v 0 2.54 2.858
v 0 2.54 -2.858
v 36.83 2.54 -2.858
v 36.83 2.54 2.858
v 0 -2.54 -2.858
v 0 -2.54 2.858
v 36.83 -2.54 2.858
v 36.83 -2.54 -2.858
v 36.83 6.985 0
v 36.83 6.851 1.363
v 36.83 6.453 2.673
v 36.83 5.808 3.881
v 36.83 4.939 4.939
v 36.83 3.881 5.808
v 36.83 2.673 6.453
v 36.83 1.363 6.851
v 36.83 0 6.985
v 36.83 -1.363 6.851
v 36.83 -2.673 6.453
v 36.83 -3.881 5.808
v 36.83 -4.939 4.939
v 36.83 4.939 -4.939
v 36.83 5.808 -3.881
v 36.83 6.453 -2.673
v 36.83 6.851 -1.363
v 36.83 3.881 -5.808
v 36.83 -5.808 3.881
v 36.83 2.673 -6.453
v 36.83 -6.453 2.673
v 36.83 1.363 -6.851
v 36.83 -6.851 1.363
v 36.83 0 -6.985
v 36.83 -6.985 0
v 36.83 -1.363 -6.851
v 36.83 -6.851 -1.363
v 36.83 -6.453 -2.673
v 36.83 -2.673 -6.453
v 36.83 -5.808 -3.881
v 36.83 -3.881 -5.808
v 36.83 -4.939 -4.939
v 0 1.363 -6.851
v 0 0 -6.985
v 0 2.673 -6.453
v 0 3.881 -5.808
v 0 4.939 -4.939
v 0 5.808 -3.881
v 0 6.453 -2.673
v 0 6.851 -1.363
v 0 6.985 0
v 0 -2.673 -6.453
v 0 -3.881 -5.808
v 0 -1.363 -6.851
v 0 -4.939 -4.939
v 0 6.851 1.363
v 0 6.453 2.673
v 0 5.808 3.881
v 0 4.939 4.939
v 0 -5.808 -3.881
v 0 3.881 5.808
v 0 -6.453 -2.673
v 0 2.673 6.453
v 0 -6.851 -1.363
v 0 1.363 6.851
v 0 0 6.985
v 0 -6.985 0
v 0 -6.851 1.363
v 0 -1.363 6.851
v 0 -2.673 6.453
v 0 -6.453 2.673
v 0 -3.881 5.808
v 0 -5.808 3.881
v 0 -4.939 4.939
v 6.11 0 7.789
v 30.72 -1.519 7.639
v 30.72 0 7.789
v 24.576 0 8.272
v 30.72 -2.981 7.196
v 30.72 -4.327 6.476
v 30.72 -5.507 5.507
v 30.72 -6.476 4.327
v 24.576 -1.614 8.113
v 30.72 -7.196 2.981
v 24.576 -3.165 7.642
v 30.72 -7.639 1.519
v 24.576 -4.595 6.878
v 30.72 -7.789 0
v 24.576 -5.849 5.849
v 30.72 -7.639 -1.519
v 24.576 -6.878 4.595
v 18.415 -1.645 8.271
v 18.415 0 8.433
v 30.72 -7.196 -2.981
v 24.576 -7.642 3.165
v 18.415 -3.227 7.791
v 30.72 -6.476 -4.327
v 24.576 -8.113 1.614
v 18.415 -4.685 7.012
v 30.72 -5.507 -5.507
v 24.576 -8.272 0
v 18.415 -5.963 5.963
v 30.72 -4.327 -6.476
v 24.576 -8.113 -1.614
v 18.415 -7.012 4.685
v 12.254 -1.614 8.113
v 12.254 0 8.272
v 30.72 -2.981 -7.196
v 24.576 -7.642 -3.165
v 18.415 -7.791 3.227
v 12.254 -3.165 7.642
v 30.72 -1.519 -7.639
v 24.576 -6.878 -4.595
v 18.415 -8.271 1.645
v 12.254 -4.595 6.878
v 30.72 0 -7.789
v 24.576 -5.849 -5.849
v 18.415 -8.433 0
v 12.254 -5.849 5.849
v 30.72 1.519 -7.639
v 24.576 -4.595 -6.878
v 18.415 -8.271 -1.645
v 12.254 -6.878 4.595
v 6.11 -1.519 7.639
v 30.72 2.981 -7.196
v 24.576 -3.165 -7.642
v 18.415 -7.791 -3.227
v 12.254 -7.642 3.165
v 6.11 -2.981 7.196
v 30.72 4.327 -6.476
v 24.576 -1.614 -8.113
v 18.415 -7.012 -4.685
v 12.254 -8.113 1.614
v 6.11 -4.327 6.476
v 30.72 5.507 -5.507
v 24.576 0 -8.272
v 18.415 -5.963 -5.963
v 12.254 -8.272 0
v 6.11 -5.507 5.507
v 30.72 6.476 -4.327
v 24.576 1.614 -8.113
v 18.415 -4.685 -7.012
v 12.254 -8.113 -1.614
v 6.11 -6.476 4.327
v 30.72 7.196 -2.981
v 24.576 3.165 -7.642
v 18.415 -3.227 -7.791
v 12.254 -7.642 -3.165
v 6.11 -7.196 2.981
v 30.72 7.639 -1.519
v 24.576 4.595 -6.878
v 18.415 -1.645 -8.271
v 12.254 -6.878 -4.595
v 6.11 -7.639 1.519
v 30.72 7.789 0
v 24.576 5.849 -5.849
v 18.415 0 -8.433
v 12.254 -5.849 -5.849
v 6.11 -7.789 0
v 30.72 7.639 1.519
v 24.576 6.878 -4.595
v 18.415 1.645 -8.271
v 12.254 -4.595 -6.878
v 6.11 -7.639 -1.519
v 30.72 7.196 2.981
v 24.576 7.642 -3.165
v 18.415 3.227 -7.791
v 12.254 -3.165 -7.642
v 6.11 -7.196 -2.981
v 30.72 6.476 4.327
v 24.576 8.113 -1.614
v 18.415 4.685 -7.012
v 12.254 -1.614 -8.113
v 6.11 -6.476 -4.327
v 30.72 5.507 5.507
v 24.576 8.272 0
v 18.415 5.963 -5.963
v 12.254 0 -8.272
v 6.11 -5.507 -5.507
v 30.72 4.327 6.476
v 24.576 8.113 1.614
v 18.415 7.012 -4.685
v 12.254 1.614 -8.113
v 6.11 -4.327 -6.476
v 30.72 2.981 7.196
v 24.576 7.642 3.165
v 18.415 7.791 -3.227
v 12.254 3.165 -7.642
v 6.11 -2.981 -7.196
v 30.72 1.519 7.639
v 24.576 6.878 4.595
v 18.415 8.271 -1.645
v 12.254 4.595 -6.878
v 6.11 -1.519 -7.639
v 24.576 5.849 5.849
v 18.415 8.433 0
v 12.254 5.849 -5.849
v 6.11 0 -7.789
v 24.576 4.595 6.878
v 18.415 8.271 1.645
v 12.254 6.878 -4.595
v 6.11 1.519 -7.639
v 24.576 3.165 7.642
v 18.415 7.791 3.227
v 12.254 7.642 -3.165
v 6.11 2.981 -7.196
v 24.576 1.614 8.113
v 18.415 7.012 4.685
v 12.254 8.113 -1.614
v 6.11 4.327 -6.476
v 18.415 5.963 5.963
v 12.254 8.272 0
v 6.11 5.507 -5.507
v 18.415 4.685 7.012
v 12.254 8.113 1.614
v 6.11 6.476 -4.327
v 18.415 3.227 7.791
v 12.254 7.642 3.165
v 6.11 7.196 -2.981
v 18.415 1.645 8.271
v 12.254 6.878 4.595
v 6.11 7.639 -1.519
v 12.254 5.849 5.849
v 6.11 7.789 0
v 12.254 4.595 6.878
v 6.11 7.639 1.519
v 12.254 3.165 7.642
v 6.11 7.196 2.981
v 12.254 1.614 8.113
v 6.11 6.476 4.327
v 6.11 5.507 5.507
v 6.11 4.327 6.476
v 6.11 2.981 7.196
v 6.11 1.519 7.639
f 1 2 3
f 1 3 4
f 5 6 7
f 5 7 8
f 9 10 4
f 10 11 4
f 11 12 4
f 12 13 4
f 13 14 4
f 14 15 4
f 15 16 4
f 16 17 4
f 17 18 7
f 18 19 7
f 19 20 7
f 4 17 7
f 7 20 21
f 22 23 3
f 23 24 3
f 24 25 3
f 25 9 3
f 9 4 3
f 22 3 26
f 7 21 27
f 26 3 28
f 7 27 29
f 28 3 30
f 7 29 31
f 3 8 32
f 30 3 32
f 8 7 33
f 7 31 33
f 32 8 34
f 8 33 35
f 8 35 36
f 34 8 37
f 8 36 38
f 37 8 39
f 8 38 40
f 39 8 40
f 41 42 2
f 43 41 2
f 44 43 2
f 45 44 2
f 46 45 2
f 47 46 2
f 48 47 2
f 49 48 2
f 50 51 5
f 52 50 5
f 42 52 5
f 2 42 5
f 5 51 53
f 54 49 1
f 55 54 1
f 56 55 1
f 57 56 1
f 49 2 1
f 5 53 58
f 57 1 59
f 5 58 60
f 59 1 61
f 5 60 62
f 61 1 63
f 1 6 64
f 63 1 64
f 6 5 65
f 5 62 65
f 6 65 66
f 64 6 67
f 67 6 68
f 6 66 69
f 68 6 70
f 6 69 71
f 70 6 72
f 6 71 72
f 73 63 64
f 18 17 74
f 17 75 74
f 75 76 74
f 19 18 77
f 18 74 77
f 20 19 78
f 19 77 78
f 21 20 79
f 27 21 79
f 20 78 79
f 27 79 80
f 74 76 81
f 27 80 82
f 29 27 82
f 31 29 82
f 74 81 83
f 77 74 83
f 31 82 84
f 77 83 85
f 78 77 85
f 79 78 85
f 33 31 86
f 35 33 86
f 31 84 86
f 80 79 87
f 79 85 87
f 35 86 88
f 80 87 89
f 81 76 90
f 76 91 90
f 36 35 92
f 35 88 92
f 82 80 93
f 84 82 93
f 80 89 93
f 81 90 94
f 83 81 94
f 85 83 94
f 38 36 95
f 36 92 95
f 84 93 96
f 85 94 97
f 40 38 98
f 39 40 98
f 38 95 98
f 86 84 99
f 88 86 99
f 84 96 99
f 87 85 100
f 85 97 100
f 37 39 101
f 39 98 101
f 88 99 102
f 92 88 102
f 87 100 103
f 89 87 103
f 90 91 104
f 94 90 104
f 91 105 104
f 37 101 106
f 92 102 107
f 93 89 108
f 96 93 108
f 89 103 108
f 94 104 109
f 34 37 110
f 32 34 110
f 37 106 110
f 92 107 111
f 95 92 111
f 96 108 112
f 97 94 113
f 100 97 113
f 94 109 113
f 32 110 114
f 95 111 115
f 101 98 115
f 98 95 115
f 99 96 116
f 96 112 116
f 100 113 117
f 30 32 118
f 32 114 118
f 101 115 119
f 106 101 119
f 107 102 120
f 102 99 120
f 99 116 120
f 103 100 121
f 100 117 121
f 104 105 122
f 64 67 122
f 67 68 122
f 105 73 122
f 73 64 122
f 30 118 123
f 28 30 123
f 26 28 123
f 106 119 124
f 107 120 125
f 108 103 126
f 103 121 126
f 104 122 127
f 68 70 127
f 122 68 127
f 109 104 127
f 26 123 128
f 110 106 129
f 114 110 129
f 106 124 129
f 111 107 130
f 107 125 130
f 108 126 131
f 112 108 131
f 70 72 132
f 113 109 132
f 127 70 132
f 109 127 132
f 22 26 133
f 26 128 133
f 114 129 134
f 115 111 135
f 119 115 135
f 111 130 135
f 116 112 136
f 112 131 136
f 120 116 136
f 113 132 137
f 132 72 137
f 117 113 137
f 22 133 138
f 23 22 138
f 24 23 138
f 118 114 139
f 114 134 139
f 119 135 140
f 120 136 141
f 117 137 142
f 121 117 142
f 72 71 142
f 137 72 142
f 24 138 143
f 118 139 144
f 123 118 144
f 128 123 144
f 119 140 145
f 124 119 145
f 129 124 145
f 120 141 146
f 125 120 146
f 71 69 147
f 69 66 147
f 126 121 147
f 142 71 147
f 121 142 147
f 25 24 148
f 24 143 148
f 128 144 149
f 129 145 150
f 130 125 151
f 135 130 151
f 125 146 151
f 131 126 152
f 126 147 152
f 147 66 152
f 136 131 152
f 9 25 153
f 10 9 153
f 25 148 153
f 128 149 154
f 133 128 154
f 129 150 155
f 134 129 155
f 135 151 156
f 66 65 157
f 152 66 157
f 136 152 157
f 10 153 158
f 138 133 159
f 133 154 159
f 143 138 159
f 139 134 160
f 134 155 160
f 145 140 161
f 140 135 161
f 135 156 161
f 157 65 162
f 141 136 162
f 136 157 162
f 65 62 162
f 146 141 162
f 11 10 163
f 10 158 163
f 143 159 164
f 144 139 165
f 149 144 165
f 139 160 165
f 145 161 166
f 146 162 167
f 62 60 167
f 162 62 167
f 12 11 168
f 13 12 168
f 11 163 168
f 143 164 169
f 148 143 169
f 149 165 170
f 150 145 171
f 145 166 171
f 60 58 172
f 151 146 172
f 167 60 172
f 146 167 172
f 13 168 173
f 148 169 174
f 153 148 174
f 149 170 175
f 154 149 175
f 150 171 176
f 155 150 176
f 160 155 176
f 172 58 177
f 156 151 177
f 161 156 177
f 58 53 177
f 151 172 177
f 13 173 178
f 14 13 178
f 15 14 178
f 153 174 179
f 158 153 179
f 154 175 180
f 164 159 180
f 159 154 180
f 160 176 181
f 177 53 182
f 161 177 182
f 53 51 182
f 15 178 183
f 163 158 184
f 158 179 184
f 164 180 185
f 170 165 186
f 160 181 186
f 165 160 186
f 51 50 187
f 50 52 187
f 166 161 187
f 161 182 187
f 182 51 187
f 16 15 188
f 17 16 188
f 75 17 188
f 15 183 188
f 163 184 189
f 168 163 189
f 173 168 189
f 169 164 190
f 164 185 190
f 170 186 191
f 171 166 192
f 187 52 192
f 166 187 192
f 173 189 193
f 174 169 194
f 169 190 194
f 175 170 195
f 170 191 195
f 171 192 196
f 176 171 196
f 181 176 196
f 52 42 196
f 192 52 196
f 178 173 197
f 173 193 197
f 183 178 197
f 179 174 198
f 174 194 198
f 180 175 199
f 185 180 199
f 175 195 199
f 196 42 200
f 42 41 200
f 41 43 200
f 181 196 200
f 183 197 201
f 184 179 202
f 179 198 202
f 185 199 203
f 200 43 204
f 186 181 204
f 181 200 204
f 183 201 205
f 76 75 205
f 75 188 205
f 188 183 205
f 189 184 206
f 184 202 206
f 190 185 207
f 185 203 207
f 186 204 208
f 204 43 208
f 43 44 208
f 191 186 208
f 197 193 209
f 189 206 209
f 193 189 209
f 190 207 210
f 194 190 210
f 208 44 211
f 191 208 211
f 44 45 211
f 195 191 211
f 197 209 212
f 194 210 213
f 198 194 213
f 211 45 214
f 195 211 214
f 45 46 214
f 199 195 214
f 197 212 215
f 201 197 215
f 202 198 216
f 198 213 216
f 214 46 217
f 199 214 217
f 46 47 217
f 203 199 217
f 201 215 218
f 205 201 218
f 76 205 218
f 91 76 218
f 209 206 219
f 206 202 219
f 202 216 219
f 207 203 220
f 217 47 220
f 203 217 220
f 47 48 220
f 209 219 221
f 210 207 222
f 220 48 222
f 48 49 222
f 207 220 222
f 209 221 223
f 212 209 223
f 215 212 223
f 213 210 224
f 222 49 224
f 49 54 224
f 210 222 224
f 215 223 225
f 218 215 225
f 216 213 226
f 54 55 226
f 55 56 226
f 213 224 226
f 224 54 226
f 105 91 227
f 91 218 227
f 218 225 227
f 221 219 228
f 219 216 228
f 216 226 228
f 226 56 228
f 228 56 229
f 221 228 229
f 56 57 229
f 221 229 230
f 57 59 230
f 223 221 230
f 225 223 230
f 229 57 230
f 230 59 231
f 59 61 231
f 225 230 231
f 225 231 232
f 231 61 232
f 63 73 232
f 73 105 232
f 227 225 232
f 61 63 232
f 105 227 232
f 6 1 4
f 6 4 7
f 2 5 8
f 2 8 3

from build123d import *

# Parameters (mm, degrees)
F3_DEPTH = 45.974


with BuildPart() as f1:
    # F0 (on Front) → F1 (revolve)
    with BuildSketch(Plane.XZ):
        with BuildLine():
            Line((0, 6.985), (0, 0))
            Line((0, 0), (36.83, 0))
            Line((36.83, 0), (36.83, 6.985))
            ThreePointArc((36.83, 6.985), (18.415, 8.4328), (0, 6.985))
        make_face()
    revolve(axis=Axis((18.415, 0, 0), (1, 0, 0)))

    # F2 (on face) → F3 (cut)
    with BuildSketch(Plane.YZ.offset(36.83)):
        Polygon((2.54, -2.8575), (2.54, 0), (2.54, 2.8575), (-2.54, 2.8575), (-2.54, 0), (-2.54, -2.8575), align=None)
    extrude(amount=-F3_DEPTH, mode=Mode.SUBTRACT)


solid = f1.part
